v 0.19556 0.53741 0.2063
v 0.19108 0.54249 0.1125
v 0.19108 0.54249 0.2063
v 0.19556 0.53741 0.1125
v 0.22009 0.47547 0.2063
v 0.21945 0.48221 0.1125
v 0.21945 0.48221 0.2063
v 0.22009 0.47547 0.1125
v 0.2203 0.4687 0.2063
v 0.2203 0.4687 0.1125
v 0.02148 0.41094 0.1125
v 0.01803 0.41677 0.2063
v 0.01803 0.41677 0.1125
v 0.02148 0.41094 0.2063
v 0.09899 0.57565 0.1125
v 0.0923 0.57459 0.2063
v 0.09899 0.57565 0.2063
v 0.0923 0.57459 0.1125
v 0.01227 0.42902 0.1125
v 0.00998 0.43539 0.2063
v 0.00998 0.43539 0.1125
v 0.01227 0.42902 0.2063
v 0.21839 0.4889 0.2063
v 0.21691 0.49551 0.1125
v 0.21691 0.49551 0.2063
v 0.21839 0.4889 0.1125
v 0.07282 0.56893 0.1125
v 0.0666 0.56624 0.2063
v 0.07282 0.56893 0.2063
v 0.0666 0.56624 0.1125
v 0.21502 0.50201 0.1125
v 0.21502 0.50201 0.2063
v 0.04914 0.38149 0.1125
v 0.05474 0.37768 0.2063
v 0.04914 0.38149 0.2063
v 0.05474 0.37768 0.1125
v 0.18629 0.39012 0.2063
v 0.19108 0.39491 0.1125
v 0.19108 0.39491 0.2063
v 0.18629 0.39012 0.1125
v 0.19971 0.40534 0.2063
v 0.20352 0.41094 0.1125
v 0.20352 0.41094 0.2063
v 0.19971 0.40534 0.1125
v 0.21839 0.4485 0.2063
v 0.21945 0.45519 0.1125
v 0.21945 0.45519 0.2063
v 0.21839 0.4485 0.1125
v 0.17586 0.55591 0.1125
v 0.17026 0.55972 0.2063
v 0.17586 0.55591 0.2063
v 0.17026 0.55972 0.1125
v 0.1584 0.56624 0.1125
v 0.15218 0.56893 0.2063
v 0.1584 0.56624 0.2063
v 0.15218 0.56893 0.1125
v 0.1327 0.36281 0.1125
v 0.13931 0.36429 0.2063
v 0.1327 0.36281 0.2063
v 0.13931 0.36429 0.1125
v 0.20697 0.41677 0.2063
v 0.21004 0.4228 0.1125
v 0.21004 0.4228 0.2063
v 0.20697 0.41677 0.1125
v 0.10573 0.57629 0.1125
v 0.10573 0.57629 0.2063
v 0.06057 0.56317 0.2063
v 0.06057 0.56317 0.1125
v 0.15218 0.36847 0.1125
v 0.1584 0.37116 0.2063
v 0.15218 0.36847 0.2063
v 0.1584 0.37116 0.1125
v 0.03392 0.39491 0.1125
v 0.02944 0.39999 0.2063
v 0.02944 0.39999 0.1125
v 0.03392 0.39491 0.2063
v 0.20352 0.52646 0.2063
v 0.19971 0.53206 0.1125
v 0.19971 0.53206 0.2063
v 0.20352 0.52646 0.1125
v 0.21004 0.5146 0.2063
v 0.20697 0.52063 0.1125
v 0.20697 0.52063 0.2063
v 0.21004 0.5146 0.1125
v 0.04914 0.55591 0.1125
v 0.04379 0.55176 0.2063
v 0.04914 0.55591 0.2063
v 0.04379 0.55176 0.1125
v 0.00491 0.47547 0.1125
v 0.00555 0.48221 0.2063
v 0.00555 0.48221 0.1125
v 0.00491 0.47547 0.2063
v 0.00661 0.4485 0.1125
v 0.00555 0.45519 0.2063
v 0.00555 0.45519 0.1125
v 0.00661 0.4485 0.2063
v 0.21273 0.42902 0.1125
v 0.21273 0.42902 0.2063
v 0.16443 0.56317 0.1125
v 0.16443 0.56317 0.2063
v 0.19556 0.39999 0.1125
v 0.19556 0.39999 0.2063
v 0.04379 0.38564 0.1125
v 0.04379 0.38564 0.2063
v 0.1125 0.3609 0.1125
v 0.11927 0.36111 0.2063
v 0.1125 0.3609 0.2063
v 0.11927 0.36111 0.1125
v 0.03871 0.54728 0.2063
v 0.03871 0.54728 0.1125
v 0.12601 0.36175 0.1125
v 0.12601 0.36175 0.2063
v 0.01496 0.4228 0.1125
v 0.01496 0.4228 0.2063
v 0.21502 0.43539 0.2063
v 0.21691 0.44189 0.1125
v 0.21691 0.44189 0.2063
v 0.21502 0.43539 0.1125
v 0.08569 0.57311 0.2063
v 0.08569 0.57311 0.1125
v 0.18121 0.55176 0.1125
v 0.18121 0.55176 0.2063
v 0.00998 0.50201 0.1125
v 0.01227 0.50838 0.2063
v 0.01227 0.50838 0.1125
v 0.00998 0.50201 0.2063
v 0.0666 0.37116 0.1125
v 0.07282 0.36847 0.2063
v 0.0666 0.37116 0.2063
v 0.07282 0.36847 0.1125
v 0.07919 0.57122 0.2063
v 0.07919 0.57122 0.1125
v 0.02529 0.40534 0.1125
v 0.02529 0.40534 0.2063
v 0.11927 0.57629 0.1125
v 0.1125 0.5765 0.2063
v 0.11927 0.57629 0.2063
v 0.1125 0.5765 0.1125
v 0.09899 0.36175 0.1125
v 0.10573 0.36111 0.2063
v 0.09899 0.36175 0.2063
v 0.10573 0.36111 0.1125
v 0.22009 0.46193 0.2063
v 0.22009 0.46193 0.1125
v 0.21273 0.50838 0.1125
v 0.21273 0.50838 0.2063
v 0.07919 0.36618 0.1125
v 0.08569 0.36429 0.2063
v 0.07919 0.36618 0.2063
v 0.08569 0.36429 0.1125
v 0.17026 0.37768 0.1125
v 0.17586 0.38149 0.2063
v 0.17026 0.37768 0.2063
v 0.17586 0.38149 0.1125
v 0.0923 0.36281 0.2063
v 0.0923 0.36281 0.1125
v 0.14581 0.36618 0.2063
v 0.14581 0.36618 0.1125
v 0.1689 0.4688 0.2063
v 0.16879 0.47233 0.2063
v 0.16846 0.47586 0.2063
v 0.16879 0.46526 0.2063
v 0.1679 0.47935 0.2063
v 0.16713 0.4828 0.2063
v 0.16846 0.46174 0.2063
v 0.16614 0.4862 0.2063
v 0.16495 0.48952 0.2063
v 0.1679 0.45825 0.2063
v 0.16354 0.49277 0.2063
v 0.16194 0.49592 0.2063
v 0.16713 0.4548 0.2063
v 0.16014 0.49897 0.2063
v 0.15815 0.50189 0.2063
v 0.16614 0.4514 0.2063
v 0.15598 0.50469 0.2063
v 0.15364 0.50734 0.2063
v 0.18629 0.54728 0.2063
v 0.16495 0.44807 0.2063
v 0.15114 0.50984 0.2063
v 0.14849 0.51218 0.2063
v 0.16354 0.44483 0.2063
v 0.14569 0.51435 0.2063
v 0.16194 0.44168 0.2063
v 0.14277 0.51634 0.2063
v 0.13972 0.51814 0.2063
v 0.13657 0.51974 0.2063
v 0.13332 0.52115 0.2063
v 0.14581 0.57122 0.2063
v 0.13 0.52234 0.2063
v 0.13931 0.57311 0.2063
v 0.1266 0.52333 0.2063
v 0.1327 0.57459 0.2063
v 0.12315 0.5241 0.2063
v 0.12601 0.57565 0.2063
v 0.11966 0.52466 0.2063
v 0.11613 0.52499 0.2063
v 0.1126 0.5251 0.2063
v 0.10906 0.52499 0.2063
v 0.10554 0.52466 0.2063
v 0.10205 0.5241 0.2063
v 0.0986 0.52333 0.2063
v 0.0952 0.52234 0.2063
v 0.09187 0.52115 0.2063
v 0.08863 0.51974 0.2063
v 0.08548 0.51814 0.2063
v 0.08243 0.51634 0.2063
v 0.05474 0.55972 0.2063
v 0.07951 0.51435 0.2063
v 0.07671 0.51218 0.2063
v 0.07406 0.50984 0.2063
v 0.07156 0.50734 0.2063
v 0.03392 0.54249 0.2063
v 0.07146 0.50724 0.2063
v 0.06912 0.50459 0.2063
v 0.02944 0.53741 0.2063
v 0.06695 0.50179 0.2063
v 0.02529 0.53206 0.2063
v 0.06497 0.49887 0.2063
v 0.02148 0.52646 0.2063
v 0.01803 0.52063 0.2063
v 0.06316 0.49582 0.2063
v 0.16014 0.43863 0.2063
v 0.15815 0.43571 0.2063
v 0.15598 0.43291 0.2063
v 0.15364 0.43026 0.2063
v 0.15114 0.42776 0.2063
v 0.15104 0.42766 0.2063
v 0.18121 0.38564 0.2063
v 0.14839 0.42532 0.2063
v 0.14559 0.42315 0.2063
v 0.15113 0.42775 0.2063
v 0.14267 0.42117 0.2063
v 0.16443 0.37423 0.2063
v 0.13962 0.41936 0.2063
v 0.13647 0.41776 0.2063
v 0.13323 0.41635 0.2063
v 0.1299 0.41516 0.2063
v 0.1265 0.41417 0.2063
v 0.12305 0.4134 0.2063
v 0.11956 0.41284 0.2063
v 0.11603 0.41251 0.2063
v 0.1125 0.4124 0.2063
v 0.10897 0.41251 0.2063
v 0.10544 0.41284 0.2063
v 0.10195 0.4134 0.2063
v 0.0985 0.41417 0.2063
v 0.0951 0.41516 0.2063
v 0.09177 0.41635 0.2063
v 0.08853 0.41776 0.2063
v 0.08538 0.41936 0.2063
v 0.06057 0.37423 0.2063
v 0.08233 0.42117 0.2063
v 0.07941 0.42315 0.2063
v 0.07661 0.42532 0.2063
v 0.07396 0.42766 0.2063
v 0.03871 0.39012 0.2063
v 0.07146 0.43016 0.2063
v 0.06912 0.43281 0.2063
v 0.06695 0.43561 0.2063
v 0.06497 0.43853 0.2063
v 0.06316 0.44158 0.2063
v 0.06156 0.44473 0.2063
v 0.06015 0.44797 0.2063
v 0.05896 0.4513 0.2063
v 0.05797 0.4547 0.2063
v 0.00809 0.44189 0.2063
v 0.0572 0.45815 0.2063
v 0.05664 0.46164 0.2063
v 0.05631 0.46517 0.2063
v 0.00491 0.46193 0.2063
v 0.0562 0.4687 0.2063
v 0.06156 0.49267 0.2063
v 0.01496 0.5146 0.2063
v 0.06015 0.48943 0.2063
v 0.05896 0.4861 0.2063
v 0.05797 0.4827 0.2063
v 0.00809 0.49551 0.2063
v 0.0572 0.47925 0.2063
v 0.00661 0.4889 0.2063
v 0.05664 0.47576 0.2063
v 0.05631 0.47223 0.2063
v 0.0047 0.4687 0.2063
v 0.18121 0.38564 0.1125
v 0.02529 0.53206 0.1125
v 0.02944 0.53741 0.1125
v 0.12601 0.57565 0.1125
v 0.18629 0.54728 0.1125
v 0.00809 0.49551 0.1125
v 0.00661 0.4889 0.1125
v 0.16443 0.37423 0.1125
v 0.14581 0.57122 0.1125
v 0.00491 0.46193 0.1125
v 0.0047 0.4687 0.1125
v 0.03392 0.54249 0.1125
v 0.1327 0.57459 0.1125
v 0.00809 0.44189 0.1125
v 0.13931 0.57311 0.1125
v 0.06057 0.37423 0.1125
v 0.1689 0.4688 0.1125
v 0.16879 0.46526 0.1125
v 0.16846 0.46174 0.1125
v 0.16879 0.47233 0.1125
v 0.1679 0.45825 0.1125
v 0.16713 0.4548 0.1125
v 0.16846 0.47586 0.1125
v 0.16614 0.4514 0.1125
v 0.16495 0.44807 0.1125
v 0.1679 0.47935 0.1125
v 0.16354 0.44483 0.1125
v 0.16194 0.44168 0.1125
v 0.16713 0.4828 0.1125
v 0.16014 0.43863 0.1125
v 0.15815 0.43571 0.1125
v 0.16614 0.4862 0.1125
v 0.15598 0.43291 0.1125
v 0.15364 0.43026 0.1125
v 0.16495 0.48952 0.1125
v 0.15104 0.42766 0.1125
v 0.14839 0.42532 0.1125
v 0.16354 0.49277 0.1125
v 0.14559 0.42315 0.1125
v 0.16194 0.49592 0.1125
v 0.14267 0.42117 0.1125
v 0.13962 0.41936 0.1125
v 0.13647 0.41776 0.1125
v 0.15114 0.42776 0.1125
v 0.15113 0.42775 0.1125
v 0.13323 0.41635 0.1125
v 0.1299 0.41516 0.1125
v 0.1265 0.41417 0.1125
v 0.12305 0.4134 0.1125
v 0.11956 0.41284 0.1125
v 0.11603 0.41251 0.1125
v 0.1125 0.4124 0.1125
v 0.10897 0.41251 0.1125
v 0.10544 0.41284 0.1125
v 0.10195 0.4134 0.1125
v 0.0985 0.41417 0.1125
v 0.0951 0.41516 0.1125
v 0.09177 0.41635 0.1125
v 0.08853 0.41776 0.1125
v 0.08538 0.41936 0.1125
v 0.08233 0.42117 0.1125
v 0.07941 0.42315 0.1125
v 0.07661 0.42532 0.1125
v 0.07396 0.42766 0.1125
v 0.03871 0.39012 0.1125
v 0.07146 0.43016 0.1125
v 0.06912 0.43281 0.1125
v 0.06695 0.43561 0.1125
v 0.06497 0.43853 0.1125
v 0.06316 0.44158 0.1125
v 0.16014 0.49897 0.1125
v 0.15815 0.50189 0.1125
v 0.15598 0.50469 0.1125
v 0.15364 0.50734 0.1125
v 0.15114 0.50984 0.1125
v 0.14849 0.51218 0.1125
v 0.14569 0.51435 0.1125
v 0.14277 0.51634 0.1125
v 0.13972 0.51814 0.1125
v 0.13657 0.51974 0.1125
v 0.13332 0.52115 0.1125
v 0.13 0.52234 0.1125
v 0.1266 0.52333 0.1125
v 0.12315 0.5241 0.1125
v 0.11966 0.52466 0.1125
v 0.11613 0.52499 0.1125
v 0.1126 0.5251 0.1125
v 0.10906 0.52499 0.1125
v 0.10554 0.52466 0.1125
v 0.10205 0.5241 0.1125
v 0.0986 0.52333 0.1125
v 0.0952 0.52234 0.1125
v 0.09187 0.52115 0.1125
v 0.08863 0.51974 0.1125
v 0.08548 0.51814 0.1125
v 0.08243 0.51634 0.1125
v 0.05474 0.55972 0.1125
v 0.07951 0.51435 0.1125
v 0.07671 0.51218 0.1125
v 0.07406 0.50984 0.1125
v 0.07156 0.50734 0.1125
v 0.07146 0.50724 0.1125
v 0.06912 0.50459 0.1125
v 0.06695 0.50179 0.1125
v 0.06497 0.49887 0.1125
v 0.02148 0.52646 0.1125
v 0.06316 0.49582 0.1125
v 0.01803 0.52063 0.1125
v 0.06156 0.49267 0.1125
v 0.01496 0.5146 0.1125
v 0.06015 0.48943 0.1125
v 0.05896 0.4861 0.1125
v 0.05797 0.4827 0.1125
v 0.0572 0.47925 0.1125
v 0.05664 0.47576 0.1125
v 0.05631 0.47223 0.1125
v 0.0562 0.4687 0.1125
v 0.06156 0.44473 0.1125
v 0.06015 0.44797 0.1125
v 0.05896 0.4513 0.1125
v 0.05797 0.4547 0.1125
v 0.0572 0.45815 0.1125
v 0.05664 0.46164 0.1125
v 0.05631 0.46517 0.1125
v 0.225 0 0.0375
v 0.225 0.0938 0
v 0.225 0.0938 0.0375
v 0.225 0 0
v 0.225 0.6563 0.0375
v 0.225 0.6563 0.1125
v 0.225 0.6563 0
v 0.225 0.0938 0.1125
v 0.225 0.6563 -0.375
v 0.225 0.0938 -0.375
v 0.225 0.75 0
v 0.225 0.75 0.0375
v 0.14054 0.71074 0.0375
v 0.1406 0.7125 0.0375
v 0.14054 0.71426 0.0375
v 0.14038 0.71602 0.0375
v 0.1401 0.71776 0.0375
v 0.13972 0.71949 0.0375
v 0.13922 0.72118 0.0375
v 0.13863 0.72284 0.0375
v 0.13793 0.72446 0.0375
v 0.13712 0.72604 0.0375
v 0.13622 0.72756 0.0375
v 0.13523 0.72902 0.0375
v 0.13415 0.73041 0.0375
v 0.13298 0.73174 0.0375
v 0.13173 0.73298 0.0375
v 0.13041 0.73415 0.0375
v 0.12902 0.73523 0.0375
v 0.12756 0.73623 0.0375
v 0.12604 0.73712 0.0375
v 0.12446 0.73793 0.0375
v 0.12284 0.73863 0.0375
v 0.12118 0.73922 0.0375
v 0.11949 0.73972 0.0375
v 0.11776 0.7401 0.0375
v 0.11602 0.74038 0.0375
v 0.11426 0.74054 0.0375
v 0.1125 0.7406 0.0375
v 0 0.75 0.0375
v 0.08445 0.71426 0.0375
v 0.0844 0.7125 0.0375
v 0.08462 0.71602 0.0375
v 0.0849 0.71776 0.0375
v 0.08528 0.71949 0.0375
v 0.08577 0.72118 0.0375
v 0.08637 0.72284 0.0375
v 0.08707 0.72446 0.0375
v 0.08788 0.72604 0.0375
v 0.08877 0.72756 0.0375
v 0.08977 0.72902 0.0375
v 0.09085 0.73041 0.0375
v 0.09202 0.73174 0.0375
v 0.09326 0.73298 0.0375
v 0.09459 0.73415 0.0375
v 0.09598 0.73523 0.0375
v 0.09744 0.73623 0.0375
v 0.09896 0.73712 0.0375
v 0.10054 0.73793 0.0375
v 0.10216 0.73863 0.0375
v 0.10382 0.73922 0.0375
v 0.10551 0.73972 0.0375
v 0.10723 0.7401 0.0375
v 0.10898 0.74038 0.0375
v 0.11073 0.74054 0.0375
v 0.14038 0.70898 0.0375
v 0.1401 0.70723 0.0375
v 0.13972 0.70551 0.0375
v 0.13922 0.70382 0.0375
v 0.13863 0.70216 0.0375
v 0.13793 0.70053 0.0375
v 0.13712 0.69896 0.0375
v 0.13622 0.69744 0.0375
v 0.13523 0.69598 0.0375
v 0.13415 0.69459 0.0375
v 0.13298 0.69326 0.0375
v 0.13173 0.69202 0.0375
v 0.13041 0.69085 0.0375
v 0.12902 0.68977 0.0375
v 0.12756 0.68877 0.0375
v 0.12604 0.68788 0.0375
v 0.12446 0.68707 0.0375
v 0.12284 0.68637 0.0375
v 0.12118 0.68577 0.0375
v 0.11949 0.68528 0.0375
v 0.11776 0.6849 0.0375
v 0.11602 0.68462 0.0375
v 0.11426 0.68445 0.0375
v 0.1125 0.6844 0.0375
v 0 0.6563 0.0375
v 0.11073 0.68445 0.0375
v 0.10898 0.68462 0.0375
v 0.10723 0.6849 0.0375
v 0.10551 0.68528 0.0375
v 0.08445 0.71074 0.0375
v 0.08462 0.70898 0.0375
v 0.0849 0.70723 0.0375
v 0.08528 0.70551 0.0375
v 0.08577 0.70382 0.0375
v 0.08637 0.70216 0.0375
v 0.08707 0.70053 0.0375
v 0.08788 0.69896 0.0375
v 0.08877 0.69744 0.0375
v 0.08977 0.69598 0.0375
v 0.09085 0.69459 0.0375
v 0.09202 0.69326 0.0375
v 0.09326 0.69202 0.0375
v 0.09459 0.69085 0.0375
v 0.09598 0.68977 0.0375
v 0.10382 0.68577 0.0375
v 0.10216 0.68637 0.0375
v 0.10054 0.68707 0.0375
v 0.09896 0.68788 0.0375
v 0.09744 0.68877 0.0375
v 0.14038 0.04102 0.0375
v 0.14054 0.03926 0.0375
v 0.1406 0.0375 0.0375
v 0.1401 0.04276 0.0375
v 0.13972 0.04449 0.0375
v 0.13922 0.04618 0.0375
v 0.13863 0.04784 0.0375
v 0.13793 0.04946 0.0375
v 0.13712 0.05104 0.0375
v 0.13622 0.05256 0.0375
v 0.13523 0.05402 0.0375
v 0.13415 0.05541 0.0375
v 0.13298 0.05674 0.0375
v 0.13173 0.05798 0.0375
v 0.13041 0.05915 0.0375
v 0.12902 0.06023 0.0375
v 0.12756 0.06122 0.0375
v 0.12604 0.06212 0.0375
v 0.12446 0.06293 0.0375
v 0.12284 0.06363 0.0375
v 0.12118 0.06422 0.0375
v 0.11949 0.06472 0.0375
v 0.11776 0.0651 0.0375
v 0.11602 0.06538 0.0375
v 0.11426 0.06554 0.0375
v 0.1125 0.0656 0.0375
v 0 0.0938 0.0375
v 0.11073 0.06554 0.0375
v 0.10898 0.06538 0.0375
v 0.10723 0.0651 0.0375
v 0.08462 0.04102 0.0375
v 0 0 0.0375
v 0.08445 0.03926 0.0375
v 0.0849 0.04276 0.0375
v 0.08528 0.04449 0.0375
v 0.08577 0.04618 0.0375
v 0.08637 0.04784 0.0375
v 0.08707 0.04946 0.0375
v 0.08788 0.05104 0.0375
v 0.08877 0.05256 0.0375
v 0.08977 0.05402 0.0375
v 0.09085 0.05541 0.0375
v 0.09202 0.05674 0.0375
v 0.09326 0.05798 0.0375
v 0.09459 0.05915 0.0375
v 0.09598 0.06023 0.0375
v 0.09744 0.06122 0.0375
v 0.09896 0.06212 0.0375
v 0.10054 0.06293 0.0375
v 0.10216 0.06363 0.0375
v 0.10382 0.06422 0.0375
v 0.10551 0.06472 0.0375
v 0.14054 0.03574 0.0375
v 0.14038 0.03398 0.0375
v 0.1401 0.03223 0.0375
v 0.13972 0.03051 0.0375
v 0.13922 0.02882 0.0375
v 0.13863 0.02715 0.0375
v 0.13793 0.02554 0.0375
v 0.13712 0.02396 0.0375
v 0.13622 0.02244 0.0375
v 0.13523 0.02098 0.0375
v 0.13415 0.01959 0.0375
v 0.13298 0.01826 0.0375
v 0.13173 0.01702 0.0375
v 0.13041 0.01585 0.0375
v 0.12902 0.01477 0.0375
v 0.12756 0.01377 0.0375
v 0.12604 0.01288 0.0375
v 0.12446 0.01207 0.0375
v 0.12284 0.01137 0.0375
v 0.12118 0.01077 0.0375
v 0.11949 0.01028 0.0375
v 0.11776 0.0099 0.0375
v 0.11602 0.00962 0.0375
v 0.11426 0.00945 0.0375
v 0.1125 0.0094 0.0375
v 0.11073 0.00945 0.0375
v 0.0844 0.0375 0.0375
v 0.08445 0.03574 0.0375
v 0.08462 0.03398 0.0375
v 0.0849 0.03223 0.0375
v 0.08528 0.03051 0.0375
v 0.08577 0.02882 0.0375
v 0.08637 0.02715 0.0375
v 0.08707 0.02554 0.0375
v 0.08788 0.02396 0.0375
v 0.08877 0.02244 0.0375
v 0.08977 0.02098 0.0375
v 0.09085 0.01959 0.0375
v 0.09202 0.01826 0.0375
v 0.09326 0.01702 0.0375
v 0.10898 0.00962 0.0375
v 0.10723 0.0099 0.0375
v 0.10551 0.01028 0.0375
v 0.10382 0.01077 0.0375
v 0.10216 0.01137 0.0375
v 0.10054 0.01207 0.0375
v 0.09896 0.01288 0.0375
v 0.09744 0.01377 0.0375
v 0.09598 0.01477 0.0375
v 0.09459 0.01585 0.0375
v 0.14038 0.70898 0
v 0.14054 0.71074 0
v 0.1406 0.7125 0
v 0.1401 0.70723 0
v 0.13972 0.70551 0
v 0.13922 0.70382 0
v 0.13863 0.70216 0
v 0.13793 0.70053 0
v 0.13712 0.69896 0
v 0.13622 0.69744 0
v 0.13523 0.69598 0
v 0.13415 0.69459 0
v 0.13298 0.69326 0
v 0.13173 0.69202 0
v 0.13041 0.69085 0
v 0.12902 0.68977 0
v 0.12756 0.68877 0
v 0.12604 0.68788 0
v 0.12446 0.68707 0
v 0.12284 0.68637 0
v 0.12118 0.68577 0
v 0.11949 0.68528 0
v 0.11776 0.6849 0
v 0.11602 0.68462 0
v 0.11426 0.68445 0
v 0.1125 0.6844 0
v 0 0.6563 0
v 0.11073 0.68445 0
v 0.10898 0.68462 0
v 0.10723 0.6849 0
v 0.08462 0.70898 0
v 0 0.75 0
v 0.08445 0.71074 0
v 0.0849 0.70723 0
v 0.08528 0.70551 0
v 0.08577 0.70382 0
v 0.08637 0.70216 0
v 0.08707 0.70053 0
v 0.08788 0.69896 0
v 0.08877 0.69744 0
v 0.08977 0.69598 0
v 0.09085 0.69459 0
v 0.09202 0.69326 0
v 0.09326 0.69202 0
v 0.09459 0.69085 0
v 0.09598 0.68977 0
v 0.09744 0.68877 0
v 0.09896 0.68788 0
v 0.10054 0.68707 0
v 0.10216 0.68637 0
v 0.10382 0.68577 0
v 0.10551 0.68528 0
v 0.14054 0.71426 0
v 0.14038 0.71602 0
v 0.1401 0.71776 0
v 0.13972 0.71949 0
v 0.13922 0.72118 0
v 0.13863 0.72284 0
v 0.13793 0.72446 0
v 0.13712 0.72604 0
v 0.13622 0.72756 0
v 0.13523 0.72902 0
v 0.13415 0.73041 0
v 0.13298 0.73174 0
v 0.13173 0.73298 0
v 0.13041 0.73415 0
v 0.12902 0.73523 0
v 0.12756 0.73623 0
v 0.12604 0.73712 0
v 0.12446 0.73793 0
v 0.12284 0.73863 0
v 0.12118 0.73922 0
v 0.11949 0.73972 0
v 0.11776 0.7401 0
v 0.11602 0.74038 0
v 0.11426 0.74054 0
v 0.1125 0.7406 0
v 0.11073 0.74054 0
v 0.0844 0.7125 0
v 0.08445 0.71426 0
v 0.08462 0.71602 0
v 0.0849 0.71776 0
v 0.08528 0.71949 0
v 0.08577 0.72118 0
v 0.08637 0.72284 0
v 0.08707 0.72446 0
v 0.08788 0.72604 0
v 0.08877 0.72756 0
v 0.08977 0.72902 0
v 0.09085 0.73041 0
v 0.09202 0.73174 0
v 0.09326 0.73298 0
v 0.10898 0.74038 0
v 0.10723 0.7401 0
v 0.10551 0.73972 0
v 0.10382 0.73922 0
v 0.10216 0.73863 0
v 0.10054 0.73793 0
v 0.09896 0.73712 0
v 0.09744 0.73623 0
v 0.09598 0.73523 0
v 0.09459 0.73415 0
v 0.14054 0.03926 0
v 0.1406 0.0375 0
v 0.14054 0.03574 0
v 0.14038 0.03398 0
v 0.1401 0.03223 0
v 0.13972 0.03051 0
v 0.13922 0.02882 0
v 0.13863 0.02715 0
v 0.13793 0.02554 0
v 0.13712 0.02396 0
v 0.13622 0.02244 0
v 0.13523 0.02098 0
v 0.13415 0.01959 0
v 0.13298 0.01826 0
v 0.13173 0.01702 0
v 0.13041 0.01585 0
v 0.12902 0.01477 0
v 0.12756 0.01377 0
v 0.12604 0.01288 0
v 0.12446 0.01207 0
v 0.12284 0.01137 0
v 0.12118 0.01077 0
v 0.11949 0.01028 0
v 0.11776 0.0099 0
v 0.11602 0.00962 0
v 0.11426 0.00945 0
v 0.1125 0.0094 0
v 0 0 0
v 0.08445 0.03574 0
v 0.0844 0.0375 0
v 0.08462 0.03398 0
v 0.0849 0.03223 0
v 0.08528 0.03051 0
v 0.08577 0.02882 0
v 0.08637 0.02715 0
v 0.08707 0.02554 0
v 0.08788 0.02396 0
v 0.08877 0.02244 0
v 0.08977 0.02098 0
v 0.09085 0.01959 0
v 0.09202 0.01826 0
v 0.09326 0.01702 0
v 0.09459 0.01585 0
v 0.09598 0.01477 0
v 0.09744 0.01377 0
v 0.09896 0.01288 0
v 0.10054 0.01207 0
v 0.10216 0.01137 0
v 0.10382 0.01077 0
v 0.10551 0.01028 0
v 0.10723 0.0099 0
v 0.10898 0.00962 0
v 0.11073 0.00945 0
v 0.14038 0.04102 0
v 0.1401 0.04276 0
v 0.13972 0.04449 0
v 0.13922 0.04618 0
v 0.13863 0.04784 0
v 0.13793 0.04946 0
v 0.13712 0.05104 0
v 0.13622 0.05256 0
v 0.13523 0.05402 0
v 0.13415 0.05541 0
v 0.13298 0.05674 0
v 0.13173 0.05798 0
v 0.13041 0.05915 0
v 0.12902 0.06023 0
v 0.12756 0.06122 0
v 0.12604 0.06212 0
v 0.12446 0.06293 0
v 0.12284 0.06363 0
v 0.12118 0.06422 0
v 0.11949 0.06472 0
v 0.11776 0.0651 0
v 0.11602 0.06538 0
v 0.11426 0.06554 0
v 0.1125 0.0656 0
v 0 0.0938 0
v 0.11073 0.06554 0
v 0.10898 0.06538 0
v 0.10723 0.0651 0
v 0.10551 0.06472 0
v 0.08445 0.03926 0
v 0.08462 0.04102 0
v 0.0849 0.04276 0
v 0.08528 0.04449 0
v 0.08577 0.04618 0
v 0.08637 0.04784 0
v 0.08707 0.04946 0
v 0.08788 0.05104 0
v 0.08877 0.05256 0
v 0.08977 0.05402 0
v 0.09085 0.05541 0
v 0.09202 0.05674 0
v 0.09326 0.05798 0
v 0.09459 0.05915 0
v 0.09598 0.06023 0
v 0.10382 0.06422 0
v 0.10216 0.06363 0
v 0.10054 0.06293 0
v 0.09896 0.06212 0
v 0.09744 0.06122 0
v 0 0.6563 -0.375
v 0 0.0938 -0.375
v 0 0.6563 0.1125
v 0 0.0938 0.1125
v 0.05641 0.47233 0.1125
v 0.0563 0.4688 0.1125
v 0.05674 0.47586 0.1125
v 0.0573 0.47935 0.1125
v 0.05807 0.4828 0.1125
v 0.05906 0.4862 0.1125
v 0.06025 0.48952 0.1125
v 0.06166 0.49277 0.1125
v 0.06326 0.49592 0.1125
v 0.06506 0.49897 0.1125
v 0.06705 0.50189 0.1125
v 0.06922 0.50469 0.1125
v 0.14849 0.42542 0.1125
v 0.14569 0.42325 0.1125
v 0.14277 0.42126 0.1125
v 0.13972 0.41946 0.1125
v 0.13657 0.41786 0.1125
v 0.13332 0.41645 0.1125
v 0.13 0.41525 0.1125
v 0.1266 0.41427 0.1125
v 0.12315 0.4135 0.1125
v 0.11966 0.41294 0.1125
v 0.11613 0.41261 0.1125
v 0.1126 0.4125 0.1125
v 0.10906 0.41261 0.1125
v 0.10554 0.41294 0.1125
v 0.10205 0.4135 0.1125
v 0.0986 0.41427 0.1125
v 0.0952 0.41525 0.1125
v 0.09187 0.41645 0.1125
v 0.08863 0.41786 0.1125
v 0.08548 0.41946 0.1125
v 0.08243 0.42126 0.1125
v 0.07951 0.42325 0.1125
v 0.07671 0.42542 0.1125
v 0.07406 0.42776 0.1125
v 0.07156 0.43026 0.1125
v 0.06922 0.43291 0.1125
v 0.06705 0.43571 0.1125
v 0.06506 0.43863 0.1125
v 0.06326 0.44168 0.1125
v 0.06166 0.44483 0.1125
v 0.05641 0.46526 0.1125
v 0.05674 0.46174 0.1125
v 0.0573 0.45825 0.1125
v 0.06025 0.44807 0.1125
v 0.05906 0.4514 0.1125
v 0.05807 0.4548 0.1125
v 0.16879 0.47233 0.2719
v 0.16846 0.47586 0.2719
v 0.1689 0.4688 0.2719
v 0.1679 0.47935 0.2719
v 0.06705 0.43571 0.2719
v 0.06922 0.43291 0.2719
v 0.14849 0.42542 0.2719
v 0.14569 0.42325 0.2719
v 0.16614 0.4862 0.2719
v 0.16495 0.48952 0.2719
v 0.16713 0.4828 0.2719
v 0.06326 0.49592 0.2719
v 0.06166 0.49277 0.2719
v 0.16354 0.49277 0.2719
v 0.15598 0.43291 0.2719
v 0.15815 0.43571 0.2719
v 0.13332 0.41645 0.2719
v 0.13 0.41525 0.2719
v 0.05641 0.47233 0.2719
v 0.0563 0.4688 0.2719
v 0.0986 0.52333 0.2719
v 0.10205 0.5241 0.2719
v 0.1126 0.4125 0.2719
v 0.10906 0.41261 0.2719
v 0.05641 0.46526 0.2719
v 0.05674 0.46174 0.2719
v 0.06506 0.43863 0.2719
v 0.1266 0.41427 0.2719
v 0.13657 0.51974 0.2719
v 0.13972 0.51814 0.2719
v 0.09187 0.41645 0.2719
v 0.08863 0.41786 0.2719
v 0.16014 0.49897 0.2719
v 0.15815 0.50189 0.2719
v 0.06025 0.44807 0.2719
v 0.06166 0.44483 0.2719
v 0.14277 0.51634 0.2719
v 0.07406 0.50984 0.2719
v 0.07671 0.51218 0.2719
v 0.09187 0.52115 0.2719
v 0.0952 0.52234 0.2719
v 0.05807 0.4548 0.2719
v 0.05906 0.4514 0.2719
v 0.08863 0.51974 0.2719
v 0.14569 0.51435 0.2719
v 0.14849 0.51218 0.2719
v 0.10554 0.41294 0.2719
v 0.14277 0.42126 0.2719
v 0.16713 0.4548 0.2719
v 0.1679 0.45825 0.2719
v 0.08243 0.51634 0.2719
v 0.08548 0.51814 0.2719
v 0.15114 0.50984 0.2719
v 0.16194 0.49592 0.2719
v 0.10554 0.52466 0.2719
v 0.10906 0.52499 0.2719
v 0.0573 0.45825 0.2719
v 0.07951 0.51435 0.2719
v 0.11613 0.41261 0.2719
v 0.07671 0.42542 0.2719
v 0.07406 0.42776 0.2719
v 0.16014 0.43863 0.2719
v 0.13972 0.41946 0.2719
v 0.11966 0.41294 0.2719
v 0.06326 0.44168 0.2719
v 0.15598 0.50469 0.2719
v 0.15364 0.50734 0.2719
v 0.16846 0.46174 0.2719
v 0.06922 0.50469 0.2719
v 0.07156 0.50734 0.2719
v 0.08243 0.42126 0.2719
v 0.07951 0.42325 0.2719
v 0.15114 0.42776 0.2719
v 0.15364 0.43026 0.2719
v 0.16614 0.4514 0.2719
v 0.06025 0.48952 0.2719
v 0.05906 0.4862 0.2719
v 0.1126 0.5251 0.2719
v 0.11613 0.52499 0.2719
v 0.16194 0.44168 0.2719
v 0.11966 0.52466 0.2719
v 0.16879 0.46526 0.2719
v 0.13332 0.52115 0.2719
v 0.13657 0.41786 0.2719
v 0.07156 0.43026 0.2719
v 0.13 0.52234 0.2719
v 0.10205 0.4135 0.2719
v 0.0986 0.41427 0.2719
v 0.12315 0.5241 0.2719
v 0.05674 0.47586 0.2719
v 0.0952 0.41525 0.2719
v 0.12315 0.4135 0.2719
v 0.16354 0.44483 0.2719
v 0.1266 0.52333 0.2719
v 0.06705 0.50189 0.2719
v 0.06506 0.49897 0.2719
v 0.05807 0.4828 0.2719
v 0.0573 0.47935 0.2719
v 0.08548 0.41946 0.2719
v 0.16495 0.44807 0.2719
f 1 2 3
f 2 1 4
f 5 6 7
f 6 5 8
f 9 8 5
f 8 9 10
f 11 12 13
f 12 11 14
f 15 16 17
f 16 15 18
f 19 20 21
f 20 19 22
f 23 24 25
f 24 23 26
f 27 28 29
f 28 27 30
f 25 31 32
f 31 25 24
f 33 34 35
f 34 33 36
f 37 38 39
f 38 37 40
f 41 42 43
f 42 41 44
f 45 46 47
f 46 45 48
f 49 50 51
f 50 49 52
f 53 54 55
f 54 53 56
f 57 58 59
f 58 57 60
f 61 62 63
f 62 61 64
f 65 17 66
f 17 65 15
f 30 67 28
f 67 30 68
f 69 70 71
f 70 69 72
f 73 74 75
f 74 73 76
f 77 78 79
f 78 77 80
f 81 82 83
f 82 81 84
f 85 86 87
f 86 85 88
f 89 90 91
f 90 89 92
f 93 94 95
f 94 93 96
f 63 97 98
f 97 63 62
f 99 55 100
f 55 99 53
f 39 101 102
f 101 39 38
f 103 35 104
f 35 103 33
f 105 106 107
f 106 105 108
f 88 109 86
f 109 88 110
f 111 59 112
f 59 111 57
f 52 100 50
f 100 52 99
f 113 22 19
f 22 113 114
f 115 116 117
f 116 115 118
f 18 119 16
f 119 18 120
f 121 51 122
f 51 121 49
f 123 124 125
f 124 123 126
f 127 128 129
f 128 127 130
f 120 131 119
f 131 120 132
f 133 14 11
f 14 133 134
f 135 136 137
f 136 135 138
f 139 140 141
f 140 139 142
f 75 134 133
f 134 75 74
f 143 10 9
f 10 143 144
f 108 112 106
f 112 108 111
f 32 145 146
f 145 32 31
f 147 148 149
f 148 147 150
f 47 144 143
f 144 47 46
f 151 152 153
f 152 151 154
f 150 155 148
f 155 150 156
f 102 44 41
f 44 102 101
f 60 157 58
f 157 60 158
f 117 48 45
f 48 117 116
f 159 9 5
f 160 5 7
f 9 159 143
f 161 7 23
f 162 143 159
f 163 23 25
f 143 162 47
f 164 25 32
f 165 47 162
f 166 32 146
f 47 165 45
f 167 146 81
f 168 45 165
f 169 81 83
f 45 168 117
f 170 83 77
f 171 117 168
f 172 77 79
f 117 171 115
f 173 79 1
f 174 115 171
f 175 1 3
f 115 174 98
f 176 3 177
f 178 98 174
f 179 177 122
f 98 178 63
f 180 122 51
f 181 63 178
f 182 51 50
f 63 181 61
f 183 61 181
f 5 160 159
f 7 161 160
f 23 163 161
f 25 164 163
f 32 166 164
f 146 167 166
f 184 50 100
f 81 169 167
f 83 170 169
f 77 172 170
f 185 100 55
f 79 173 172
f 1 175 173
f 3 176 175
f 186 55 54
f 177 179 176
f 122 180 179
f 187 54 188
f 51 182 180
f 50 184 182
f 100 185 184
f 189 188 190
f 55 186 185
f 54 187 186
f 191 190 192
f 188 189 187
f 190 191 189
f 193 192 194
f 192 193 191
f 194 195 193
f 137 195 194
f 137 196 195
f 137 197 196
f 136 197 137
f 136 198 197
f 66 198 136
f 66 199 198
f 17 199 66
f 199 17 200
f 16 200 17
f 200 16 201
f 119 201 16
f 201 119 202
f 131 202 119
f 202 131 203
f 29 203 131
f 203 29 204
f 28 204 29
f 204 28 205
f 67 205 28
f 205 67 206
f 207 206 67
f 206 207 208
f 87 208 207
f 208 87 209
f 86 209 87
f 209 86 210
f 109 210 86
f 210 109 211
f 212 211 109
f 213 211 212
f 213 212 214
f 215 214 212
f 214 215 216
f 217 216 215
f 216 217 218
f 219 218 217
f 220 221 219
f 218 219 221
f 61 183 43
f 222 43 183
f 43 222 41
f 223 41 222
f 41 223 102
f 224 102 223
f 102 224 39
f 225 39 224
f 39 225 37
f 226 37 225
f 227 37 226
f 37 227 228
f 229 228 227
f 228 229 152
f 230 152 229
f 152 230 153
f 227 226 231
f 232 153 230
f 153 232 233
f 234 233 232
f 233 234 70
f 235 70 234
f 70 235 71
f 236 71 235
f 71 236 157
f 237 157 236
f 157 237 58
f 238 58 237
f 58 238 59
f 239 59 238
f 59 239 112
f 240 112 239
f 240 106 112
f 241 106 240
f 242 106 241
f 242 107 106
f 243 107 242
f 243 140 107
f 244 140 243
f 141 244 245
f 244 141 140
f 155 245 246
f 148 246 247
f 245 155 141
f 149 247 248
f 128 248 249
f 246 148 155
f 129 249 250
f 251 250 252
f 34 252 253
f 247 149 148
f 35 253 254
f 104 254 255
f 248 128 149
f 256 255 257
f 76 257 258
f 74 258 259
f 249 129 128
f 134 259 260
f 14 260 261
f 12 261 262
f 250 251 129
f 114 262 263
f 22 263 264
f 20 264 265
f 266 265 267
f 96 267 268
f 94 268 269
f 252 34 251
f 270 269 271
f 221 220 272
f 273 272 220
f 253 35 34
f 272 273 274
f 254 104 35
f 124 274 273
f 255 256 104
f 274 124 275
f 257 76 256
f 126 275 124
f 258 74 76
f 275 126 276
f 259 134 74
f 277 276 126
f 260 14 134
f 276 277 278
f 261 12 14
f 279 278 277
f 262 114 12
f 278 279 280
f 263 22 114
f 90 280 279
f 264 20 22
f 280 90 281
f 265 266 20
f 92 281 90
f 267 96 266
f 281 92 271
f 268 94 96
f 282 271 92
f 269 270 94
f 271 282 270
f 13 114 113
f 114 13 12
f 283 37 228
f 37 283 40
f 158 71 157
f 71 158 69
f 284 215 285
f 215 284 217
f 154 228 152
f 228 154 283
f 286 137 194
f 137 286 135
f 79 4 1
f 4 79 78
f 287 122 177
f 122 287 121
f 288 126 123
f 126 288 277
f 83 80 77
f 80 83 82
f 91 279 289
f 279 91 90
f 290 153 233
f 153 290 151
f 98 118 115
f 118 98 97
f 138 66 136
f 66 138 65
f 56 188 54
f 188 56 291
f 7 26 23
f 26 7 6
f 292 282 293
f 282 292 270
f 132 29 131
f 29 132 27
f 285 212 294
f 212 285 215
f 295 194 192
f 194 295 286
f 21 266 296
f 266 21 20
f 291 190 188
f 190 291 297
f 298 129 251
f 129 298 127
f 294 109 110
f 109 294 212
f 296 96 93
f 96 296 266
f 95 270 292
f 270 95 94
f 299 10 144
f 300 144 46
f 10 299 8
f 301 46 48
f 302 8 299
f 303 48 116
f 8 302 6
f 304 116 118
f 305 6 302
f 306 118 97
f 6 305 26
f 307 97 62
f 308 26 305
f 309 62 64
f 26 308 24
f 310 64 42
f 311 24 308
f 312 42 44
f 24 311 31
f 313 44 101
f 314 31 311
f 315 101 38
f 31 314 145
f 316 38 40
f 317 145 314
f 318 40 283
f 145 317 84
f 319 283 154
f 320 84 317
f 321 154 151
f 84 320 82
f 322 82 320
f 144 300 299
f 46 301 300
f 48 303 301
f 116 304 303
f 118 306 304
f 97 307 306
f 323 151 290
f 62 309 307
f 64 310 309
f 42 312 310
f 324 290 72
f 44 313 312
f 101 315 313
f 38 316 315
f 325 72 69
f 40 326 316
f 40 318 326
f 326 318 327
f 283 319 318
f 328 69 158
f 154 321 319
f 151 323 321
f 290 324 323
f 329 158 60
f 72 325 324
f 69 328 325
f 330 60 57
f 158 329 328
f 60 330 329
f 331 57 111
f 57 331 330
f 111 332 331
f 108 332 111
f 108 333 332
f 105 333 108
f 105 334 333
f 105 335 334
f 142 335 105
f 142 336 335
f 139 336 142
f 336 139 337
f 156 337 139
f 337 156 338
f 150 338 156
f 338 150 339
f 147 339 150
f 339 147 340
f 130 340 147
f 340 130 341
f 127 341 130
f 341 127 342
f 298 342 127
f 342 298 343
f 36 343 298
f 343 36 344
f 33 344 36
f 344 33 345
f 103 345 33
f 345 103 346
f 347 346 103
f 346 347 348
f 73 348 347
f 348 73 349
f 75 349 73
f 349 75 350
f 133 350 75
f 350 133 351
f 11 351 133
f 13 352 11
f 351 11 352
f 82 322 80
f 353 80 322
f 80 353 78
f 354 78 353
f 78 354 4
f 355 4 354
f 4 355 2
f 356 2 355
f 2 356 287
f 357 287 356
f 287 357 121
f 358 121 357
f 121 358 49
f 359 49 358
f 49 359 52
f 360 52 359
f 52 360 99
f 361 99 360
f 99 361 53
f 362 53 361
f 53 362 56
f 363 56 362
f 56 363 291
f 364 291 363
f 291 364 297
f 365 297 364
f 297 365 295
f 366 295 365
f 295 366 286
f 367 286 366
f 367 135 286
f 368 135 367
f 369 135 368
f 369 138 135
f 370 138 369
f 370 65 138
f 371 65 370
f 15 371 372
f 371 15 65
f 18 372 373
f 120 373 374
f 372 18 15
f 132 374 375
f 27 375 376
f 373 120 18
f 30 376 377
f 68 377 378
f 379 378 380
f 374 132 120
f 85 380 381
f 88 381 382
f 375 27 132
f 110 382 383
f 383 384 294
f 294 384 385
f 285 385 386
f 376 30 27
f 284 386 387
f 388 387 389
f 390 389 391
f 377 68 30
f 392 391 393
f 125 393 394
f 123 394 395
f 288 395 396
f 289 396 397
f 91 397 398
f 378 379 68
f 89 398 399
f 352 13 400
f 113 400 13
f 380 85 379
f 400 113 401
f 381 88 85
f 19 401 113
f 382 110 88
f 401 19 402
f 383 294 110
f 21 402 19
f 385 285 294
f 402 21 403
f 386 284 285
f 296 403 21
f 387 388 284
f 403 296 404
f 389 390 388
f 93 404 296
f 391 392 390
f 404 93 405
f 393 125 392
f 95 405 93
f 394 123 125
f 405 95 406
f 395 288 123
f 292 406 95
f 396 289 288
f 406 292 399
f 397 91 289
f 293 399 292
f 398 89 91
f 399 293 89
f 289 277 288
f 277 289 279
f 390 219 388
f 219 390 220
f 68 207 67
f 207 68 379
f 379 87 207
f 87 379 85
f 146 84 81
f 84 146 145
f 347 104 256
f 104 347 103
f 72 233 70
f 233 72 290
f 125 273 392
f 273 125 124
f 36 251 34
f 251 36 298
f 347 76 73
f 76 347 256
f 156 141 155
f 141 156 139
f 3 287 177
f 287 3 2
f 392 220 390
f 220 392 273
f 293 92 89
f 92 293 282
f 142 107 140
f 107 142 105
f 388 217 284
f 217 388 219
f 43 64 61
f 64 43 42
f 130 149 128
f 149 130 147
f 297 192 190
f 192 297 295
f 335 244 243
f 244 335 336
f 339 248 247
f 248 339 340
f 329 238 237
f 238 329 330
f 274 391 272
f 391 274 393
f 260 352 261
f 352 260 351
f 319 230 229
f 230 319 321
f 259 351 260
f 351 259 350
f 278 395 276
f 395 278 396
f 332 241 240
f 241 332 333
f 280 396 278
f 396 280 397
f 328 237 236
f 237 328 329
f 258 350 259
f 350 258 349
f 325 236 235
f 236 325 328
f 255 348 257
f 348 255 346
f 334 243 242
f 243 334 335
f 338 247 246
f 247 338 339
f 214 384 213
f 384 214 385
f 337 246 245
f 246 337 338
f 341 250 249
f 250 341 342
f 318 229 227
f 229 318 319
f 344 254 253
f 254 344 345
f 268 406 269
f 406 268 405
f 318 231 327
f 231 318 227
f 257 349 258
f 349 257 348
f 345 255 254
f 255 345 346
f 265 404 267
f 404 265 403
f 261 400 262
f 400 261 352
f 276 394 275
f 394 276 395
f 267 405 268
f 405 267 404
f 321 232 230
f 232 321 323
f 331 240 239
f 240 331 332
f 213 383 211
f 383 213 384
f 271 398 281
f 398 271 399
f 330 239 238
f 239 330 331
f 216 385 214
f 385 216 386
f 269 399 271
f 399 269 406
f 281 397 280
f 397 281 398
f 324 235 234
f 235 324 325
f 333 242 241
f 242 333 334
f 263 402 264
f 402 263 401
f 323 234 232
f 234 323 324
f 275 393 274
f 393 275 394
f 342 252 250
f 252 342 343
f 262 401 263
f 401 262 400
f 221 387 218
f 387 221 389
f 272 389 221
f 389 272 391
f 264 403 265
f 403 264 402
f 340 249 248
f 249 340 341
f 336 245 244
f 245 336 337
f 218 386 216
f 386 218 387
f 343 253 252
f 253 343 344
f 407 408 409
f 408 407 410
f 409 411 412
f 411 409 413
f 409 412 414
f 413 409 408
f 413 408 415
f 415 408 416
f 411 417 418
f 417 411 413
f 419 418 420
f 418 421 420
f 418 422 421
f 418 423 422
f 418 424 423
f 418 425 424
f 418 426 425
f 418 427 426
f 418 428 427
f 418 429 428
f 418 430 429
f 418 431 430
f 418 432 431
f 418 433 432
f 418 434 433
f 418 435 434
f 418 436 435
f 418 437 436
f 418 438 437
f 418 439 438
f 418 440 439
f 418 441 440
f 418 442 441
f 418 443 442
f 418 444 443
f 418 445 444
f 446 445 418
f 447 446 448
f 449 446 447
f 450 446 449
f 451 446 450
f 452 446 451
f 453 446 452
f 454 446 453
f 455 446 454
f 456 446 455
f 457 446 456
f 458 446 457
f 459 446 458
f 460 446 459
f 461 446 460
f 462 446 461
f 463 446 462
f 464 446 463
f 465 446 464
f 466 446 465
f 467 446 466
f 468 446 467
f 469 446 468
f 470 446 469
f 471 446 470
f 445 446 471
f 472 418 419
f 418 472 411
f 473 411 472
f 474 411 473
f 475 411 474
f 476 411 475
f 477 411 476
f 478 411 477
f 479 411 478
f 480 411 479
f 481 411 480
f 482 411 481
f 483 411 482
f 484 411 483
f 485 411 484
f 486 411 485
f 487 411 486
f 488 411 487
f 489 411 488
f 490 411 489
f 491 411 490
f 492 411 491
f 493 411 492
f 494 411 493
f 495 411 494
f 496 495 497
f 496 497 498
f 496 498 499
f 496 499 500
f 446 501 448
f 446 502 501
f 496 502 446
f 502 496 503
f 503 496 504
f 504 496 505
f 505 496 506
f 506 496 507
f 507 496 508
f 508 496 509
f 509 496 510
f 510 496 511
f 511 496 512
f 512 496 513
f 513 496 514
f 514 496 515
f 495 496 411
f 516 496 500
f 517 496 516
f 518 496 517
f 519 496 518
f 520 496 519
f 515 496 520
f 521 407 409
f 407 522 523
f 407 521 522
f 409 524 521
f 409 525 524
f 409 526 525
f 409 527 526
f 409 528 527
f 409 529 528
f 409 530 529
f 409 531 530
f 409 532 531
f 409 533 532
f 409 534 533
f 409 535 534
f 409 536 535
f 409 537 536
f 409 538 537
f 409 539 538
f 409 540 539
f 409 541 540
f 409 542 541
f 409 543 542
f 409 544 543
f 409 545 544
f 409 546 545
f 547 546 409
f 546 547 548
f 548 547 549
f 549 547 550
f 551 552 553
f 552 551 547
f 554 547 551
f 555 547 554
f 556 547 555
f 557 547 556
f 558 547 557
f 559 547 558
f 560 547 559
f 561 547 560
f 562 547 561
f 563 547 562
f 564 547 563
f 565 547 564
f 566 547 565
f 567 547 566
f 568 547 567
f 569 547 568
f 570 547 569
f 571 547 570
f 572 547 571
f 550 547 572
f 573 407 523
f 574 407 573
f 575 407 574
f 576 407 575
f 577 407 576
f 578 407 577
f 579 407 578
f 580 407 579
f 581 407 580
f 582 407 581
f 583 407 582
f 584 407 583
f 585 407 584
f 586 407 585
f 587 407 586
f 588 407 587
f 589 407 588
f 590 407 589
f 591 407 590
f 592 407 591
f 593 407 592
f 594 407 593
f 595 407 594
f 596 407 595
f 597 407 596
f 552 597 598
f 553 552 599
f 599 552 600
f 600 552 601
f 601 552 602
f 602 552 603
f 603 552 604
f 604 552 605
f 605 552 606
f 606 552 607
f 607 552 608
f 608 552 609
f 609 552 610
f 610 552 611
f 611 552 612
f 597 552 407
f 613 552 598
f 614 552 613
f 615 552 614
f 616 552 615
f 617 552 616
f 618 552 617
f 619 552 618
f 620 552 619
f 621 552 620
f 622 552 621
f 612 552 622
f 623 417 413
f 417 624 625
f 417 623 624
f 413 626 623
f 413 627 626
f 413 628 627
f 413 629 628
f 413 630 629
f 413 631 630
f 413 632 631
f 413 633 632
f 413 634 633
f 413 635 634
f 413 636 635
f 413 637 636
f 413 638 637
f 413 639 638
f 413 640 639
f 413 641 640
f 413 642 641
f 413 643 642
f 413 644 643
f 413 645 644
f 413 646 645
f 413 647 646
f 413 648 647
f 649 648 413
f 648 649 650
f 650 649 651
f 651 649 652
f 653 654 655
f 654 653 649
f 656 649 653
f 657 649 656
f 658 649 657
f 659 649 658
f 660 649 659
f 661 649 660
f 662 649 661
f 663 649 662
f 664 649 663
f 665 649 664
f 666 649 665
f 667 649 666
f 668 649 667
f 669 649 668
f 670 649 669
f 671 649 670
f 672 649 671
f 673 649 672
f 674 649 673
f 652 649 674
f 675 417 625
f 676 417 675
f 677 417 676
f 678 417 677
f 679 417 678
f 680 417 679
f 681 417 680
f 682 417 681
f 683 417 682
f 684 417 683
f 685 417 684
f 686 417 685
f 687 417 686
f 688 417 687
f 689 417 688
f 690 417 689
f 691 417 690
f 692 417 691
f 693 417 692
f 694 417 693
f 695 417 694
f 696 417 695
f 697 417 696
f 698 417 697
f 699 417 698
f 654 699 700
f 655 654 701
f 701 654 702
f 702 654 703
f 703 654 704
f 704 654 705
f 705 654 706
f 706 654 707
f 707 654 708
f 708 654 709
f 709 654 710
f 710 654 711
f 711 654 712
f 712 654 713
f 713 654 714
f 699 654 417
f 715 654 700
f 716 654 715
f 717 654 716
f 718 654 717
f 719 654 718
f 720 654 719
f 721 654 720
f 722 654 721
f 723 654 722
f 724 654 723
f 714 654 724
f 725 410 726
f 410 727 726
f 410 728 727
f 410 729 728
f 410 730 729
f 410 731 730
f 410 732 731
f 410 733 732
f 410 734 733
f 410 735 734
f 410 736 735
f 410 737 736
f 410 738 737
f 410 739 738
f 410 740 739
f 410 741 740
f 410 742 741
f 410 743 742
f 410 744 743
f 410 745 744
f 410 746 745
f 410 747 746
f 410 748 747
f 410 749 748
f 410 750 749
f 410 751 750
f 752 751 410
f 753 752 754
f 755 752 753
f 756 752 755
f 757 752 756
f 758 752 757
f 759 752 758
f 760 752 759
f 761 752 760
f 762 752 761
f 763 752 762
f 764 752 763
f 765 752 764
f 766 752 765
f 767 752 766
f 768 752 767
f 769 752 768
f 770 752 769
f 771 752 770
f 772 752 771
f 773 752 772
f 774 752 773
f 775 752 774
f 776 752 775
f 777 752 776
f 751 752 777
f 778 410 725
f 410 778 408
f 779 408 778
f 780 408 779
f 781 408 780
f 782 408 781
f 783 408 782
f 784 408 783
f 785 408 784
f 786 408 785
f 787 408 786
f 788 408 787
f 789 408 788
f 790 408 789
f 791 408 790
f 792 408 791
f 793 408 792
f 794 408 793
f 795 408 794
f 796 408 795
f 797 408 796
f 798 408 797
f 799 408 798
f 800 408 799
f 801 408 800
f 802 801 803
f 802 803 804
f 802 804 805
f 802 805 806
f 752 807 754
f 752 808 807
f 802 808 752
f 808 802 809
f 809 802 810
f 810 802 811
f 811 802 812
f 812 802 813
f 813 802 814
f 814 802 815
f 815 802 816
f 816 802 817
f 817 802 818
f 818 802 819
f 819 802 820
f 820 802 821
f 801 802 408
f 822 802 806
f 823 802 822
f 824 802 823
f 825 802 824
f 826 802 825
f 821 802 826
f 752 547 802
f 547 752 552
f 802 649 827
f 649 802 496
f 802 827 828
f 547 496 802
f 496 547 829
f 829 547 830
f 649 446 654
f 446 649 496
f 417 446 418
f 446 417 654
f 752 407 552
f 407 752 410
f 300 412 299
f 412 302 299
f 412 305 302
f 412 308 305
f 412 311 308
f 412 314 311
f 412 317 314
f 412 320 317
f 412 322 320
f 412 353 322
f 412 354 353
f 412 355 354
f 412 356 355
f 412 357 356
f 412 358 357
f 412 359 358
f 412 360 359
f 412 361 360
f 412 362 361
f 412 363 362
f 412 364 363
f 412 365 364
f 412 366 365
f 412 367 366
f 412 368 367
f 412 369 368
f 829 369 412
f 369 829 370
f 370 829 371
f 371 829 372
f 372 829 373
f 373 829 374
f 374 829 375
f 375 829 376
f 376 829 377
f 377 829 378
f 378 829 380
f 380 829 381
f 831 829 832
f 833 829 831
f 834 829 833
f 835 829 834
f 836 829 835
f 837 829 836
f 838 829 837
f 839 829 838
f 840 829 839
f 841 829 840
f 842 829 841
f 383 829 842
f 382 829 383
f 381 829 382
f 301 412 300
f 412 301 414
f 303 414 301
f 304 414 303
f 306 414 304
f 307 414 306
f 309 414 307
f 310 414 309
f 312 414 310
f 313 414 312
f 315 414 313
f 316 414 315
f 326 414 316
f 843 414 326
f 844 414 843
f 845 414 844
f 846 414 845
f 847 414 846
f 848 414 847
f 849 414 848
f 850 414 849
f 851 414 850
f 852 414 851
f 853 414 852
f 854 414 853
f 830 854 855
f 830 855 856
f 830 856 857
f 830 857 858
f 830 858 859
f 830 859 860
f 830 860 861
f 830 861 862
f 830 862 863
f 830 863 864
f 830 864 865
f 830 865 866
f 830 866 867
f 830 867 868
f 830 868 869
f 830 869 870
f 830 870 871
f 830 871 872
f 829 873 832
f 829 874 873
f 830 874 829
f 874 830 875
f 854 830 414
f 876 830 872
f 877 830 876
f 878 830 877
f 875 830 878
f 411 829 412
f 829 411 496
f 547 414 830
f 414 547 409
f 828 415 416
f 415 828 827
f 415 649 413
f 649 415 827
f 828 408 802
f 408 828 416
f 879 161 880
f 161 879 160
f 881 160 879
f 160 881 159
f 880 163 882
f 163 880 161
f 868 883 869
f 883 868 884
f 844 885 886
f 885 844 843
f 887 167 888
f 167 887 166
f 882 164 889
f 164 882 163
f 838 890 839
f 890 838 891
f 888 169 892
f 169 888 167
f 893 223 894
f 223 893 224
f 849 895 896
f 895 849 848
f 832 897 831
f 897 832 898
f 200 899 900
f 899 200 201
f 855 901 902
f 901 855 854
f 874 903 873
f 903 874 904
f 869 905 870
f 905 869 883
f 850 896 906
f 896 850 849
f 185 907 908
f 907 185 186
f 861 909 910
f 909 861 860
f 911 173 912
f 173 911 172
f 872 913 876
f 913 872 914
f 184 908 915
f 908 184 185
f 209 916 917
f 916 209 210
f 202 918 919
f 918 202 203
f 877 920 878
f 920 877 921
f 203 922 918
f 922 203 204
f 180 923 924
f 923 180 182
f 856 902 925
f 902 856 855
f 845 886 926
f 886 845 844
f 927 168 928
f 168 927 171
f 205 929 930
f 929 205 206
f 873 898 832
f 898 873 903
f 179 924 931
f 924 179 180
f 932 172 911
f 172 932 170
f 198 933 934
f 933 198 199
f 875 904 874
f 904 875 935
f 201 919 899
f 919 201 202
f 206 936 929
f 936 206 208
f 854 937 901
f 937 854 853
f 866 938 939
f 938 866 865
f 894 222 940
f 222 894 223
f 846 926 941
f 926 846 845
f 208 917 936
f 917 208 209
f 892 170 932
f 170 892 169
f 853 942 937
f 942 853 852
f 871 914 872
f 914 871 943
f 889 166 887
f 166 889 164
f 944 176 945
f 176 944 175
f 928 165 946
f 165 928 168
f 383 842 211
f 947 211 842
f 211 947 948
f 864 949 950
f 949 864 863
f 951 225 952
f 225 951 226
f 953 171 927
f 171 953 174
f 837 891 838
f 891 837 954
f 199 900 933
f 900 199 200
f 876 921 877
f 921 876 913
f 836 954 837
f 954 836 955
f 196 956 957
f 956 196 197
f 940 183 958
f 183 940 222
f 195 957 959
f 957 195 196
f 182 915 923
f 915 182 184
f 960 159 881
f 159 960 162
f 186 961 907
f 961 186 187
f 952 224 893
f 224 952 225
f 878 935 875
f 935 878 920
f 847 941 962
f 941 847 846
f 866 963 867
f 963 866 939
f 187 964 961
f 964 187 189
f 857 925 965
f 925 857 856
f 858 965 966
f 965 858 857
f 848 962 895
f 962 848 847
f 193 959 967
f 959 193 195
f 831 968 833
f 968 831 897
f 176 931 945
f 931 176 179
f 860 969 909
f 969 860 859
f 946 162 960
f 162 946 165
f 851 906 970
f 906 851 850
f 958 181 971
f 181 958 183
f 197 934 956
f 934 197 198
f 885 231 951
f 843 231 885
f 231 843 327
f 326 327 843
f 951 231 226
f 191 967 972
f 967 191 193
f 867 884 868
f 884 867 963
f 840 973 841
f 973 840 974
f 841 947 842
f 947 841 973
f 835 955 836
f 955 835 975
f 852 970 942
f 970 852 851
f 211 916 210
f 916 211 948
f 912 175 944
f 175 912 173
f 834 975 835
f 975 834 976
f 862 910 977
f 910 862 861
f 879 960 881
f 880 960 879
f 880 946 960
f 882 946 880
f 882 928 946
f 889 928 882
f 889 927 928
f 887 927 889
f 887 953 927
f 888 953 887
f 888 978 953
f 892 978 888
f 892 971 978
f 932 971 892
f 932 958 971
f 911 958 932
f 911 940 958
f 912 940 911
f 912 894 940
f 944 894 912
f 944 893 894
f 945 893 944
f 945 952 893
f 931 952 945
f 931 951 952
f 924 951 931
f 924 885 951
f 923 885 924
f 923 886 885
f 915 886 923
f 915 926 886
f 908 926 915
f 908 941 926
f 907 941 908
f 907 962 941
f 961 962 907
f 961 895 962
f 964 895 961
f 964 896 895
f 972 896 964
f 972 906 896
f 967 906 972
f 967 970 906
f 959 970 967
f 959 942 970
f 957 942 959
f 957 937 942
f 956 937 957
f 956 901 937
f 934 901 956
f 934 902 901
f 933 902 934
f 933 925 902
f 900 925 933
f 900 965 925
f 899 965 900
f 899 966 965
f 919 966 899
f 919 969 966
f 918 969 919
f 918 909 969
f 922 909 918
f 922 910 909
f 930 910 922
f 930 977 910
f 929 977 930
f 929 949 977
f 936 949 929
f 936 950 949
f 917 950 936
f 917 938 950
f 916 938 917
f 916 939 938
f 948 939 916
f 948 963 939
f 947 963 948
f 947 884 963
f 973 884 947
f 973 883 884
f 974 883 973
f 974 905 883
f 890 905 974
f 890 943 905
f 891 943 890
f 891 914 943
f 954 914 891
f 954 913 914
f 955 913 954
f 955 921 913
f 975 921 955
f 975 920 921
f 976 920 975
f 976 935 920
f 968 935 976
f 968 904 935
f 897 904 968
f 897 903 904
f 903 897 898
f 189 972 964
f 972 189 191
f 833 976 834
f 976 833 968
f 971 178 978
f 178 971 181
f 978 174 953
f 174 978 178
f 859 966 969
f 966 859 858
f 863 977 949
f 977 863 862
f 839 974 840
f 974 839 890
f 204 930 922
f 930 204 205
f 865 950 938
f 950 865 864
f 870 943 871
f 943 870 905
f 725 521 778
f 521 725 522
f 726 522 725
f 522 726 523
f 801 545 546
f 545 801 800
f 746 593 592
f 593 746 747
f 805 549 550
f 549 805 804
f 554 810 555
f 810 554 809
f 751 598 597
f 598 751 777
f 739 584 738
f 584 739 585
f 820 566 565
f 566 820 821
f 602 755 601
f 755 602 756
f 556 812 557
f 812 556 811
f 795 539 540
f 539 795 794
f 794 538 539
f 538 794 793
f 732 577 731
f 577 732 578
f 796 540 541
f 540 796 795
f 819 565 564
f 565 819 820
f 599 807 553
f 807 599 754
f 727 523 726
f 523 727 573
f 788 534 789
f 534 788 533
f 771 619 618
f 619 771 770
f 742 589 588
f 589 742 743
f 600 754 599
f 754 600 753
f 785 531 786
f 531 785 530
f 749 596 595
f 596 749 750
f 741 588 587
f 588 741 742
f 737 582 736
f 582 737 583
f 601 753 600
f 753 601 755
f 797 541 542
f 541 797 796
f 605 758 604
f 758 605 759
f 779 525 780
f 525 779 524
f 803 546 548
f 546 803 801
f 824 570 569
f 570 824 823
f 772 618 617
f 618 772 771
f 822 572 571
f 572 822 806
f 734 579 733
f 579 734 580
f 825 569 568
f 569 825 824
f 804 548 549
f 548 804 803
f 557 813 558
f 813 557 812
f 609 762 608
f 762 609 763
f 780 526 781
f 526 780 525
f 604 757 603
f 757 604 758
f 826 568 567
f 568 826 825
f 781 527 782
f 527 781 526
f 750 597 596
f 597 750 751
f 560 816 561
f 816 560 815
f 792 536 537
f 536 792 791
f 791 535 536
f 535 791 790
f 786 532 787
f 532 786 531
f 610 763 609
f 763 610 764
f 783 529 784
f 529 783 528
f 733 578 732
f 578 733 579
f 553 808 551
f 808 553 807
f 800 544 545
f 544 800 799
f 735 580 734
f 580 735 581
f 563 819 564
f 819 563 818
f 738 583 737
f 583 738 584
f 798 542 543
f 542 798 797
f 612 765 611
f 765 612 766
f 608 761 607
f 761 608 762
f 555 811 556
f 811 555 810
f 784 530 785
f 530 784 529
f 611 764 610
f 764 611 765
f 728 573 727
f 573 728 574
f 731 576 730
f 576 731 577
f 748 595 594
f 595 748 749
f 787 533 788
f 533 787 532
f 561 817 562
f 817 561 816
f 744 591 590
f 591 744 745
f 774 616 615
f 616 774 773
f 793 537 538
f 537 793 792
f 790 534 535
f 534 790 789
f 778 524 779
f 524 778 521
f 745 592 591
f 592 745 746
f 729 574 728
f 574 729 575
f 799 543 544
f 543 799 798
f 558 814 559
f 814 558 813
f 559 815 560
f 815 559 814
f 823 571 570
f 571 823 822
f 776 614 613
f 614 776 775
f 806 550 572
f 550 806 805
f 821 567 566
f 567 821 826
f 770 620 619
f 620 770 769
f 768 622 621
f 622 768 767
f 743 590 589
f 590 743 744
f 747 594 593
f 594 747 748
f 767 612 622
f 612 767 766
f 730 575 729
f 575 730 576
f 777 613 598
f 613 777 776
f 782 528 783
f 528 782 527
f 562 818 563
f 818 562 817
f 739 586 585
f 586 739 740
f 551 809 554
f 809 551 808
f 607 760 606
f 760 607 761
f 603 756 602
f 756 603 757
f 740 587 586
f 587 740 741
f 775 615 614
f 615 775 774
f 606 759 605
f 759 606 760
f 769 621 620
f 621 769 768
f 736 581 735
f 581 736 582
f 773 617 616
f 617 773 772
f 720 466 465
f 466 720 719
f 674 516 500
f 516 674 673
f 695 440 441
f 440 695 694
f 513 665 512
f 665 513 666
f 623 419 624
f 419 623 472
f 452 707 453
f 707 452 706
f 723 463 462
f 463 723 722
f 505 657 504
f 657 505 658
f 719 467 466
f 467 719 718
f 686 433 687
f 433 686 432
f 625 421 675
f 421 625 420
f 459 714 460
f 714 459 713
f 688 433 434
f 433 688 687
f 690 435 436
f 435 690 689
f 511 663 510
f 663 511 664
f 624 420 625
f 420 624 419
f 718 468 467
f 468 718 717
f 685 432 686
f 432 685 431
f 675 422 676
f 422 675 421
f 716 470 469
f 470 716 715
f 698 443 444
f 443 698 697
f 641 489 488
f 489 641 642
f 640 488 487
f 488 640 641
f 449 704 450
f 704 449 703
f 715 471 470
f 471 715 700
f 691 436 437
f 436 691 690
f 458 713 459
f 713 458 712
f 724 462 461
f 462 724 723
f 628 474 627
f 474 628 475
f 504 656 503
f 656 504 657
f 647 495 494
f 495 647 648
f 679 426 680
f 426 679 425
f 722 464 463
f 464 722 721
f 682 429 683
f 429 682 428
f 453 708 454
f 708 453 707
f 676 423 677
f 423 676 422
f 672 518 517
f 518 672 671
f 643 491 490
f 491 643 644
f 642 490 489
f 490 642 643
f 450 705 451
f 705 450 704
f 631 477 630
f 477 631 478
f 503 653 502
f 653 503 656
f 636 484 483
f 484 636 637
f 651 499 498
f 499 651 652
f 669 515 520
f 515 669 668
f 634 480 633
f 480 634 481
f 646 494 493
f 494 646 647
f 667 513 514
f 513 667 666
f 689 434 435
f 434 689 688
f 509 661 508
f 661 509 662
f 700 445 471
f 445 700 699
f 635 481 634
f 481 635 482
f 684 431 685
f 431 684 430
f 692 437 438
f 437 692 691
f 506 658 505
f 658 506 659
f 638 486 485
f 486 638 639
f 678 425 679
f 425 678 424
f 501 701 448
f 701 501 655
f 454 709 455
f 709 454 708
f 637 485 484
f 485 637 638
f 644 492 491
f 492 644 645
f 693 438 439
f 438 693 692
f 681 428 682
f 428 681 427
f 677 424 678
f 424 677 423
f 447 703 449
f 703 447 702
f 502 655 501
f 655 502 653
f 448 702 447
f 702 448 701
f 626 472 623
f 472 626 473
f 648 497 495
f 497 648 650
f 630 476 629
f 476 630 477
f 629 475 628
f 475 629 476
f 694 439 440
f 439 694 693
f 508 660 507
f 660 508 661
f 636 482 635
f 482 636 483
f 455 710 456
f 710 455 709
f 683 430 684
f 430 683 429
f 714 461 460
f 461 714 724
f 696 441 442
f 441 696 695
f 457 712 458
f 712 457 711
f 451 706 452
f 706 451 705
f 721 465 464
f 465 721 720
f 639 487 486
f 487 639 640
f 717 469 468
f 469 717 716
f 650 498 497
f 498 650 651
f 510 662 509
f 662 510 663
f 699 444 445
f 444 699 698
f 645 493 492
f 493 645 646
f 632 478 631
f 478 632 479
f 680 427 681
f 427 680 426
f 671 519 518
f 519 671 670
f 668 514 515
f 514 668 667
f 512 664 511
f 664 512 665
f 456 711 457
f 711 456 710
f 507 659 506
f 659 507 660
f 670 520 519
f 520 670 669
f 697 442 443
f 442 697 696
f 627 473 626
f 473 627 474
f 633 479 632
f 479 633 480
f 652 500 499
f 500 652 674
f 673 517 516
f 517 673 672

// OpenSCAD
// === Parametric Dimensions ===

// Main rectangular plate
plate_length = 0.225;
plate_width  = 0.75;
plate_thick  = 0.0375;

// Through-hole parameters
hole_radius  = 0.0281;
hole_x       = 0.1125;     // Centered in X
hole_y1      = 0.0375;     // Front hole
hole_y2      = 0.7125;     // Back hole

// Central upper rectangular solid
upper_width  = 0.5625;
upper_y_off  = 0.0938;     // Front offset (back = 0.0937)
upper_height = 0.1125;     // Rises from base datum

// Central underside rectangular solid (same footprint)
lower_width  = 0.5625;
lower_height = 0.375;      // Extends downward

// Annular collar (hollow ring above shoulder)
collar_or     = 0.1078;    // Outer radius
collar_ir     = 0.0563;    // Inner radius
collar_cx     = 0.1125;
collar_cy     = 0.4687;
collar_height = 0.0938;

// Solid circular pin (above shoulder)
pin_r      = 0.0563;
pin_cx     = 0.1126;
pin_cy     = 0.4688;
pin_height = 0.1594;

$fn = 100;

// === Main Assembly ===
difference() {
    union() {
        // 1. Main rectangular plate at base datum z=0
        cube([plate_length, plate_width, plate_thick]);

        // 2. Central upper solid rising from base datum
        translate([0, upper_y_off, 0])
            cube([plate_length, upper_width, upper_height]);

        // 3. Central underside solid extending downward
        translate([0, upper_y_off, -lower_height])
            cube([plate_length, lower_width, lower_height]);

        // 4. Annular collar (hollow ring) above the shoulder
        translate([collar_cx, collar_cy, upper_height])
            difference() {
                cylinder(h=collar_height, r=collar_or);
                translate([0, 0, -0.001])
                    cylinder(h=collar_height + 0.002, r=collar_ir);
            }

        // 5. Solid circular pin above the shoulder
        translate([pin_cx, pin_cy, upper_height])
            cylinder(h=pin_height, r=pin_r);
    }

    // 6. Front through-hole in plate
    translate([hole_x, hole_y1, -1])
        cylinder(h=2, r=hole_radius);

    // 7. Back through-hole in plate
    translate([hole_x, hole_y2, -1])
        cylinder(h=2, r=hole_radius);
}
